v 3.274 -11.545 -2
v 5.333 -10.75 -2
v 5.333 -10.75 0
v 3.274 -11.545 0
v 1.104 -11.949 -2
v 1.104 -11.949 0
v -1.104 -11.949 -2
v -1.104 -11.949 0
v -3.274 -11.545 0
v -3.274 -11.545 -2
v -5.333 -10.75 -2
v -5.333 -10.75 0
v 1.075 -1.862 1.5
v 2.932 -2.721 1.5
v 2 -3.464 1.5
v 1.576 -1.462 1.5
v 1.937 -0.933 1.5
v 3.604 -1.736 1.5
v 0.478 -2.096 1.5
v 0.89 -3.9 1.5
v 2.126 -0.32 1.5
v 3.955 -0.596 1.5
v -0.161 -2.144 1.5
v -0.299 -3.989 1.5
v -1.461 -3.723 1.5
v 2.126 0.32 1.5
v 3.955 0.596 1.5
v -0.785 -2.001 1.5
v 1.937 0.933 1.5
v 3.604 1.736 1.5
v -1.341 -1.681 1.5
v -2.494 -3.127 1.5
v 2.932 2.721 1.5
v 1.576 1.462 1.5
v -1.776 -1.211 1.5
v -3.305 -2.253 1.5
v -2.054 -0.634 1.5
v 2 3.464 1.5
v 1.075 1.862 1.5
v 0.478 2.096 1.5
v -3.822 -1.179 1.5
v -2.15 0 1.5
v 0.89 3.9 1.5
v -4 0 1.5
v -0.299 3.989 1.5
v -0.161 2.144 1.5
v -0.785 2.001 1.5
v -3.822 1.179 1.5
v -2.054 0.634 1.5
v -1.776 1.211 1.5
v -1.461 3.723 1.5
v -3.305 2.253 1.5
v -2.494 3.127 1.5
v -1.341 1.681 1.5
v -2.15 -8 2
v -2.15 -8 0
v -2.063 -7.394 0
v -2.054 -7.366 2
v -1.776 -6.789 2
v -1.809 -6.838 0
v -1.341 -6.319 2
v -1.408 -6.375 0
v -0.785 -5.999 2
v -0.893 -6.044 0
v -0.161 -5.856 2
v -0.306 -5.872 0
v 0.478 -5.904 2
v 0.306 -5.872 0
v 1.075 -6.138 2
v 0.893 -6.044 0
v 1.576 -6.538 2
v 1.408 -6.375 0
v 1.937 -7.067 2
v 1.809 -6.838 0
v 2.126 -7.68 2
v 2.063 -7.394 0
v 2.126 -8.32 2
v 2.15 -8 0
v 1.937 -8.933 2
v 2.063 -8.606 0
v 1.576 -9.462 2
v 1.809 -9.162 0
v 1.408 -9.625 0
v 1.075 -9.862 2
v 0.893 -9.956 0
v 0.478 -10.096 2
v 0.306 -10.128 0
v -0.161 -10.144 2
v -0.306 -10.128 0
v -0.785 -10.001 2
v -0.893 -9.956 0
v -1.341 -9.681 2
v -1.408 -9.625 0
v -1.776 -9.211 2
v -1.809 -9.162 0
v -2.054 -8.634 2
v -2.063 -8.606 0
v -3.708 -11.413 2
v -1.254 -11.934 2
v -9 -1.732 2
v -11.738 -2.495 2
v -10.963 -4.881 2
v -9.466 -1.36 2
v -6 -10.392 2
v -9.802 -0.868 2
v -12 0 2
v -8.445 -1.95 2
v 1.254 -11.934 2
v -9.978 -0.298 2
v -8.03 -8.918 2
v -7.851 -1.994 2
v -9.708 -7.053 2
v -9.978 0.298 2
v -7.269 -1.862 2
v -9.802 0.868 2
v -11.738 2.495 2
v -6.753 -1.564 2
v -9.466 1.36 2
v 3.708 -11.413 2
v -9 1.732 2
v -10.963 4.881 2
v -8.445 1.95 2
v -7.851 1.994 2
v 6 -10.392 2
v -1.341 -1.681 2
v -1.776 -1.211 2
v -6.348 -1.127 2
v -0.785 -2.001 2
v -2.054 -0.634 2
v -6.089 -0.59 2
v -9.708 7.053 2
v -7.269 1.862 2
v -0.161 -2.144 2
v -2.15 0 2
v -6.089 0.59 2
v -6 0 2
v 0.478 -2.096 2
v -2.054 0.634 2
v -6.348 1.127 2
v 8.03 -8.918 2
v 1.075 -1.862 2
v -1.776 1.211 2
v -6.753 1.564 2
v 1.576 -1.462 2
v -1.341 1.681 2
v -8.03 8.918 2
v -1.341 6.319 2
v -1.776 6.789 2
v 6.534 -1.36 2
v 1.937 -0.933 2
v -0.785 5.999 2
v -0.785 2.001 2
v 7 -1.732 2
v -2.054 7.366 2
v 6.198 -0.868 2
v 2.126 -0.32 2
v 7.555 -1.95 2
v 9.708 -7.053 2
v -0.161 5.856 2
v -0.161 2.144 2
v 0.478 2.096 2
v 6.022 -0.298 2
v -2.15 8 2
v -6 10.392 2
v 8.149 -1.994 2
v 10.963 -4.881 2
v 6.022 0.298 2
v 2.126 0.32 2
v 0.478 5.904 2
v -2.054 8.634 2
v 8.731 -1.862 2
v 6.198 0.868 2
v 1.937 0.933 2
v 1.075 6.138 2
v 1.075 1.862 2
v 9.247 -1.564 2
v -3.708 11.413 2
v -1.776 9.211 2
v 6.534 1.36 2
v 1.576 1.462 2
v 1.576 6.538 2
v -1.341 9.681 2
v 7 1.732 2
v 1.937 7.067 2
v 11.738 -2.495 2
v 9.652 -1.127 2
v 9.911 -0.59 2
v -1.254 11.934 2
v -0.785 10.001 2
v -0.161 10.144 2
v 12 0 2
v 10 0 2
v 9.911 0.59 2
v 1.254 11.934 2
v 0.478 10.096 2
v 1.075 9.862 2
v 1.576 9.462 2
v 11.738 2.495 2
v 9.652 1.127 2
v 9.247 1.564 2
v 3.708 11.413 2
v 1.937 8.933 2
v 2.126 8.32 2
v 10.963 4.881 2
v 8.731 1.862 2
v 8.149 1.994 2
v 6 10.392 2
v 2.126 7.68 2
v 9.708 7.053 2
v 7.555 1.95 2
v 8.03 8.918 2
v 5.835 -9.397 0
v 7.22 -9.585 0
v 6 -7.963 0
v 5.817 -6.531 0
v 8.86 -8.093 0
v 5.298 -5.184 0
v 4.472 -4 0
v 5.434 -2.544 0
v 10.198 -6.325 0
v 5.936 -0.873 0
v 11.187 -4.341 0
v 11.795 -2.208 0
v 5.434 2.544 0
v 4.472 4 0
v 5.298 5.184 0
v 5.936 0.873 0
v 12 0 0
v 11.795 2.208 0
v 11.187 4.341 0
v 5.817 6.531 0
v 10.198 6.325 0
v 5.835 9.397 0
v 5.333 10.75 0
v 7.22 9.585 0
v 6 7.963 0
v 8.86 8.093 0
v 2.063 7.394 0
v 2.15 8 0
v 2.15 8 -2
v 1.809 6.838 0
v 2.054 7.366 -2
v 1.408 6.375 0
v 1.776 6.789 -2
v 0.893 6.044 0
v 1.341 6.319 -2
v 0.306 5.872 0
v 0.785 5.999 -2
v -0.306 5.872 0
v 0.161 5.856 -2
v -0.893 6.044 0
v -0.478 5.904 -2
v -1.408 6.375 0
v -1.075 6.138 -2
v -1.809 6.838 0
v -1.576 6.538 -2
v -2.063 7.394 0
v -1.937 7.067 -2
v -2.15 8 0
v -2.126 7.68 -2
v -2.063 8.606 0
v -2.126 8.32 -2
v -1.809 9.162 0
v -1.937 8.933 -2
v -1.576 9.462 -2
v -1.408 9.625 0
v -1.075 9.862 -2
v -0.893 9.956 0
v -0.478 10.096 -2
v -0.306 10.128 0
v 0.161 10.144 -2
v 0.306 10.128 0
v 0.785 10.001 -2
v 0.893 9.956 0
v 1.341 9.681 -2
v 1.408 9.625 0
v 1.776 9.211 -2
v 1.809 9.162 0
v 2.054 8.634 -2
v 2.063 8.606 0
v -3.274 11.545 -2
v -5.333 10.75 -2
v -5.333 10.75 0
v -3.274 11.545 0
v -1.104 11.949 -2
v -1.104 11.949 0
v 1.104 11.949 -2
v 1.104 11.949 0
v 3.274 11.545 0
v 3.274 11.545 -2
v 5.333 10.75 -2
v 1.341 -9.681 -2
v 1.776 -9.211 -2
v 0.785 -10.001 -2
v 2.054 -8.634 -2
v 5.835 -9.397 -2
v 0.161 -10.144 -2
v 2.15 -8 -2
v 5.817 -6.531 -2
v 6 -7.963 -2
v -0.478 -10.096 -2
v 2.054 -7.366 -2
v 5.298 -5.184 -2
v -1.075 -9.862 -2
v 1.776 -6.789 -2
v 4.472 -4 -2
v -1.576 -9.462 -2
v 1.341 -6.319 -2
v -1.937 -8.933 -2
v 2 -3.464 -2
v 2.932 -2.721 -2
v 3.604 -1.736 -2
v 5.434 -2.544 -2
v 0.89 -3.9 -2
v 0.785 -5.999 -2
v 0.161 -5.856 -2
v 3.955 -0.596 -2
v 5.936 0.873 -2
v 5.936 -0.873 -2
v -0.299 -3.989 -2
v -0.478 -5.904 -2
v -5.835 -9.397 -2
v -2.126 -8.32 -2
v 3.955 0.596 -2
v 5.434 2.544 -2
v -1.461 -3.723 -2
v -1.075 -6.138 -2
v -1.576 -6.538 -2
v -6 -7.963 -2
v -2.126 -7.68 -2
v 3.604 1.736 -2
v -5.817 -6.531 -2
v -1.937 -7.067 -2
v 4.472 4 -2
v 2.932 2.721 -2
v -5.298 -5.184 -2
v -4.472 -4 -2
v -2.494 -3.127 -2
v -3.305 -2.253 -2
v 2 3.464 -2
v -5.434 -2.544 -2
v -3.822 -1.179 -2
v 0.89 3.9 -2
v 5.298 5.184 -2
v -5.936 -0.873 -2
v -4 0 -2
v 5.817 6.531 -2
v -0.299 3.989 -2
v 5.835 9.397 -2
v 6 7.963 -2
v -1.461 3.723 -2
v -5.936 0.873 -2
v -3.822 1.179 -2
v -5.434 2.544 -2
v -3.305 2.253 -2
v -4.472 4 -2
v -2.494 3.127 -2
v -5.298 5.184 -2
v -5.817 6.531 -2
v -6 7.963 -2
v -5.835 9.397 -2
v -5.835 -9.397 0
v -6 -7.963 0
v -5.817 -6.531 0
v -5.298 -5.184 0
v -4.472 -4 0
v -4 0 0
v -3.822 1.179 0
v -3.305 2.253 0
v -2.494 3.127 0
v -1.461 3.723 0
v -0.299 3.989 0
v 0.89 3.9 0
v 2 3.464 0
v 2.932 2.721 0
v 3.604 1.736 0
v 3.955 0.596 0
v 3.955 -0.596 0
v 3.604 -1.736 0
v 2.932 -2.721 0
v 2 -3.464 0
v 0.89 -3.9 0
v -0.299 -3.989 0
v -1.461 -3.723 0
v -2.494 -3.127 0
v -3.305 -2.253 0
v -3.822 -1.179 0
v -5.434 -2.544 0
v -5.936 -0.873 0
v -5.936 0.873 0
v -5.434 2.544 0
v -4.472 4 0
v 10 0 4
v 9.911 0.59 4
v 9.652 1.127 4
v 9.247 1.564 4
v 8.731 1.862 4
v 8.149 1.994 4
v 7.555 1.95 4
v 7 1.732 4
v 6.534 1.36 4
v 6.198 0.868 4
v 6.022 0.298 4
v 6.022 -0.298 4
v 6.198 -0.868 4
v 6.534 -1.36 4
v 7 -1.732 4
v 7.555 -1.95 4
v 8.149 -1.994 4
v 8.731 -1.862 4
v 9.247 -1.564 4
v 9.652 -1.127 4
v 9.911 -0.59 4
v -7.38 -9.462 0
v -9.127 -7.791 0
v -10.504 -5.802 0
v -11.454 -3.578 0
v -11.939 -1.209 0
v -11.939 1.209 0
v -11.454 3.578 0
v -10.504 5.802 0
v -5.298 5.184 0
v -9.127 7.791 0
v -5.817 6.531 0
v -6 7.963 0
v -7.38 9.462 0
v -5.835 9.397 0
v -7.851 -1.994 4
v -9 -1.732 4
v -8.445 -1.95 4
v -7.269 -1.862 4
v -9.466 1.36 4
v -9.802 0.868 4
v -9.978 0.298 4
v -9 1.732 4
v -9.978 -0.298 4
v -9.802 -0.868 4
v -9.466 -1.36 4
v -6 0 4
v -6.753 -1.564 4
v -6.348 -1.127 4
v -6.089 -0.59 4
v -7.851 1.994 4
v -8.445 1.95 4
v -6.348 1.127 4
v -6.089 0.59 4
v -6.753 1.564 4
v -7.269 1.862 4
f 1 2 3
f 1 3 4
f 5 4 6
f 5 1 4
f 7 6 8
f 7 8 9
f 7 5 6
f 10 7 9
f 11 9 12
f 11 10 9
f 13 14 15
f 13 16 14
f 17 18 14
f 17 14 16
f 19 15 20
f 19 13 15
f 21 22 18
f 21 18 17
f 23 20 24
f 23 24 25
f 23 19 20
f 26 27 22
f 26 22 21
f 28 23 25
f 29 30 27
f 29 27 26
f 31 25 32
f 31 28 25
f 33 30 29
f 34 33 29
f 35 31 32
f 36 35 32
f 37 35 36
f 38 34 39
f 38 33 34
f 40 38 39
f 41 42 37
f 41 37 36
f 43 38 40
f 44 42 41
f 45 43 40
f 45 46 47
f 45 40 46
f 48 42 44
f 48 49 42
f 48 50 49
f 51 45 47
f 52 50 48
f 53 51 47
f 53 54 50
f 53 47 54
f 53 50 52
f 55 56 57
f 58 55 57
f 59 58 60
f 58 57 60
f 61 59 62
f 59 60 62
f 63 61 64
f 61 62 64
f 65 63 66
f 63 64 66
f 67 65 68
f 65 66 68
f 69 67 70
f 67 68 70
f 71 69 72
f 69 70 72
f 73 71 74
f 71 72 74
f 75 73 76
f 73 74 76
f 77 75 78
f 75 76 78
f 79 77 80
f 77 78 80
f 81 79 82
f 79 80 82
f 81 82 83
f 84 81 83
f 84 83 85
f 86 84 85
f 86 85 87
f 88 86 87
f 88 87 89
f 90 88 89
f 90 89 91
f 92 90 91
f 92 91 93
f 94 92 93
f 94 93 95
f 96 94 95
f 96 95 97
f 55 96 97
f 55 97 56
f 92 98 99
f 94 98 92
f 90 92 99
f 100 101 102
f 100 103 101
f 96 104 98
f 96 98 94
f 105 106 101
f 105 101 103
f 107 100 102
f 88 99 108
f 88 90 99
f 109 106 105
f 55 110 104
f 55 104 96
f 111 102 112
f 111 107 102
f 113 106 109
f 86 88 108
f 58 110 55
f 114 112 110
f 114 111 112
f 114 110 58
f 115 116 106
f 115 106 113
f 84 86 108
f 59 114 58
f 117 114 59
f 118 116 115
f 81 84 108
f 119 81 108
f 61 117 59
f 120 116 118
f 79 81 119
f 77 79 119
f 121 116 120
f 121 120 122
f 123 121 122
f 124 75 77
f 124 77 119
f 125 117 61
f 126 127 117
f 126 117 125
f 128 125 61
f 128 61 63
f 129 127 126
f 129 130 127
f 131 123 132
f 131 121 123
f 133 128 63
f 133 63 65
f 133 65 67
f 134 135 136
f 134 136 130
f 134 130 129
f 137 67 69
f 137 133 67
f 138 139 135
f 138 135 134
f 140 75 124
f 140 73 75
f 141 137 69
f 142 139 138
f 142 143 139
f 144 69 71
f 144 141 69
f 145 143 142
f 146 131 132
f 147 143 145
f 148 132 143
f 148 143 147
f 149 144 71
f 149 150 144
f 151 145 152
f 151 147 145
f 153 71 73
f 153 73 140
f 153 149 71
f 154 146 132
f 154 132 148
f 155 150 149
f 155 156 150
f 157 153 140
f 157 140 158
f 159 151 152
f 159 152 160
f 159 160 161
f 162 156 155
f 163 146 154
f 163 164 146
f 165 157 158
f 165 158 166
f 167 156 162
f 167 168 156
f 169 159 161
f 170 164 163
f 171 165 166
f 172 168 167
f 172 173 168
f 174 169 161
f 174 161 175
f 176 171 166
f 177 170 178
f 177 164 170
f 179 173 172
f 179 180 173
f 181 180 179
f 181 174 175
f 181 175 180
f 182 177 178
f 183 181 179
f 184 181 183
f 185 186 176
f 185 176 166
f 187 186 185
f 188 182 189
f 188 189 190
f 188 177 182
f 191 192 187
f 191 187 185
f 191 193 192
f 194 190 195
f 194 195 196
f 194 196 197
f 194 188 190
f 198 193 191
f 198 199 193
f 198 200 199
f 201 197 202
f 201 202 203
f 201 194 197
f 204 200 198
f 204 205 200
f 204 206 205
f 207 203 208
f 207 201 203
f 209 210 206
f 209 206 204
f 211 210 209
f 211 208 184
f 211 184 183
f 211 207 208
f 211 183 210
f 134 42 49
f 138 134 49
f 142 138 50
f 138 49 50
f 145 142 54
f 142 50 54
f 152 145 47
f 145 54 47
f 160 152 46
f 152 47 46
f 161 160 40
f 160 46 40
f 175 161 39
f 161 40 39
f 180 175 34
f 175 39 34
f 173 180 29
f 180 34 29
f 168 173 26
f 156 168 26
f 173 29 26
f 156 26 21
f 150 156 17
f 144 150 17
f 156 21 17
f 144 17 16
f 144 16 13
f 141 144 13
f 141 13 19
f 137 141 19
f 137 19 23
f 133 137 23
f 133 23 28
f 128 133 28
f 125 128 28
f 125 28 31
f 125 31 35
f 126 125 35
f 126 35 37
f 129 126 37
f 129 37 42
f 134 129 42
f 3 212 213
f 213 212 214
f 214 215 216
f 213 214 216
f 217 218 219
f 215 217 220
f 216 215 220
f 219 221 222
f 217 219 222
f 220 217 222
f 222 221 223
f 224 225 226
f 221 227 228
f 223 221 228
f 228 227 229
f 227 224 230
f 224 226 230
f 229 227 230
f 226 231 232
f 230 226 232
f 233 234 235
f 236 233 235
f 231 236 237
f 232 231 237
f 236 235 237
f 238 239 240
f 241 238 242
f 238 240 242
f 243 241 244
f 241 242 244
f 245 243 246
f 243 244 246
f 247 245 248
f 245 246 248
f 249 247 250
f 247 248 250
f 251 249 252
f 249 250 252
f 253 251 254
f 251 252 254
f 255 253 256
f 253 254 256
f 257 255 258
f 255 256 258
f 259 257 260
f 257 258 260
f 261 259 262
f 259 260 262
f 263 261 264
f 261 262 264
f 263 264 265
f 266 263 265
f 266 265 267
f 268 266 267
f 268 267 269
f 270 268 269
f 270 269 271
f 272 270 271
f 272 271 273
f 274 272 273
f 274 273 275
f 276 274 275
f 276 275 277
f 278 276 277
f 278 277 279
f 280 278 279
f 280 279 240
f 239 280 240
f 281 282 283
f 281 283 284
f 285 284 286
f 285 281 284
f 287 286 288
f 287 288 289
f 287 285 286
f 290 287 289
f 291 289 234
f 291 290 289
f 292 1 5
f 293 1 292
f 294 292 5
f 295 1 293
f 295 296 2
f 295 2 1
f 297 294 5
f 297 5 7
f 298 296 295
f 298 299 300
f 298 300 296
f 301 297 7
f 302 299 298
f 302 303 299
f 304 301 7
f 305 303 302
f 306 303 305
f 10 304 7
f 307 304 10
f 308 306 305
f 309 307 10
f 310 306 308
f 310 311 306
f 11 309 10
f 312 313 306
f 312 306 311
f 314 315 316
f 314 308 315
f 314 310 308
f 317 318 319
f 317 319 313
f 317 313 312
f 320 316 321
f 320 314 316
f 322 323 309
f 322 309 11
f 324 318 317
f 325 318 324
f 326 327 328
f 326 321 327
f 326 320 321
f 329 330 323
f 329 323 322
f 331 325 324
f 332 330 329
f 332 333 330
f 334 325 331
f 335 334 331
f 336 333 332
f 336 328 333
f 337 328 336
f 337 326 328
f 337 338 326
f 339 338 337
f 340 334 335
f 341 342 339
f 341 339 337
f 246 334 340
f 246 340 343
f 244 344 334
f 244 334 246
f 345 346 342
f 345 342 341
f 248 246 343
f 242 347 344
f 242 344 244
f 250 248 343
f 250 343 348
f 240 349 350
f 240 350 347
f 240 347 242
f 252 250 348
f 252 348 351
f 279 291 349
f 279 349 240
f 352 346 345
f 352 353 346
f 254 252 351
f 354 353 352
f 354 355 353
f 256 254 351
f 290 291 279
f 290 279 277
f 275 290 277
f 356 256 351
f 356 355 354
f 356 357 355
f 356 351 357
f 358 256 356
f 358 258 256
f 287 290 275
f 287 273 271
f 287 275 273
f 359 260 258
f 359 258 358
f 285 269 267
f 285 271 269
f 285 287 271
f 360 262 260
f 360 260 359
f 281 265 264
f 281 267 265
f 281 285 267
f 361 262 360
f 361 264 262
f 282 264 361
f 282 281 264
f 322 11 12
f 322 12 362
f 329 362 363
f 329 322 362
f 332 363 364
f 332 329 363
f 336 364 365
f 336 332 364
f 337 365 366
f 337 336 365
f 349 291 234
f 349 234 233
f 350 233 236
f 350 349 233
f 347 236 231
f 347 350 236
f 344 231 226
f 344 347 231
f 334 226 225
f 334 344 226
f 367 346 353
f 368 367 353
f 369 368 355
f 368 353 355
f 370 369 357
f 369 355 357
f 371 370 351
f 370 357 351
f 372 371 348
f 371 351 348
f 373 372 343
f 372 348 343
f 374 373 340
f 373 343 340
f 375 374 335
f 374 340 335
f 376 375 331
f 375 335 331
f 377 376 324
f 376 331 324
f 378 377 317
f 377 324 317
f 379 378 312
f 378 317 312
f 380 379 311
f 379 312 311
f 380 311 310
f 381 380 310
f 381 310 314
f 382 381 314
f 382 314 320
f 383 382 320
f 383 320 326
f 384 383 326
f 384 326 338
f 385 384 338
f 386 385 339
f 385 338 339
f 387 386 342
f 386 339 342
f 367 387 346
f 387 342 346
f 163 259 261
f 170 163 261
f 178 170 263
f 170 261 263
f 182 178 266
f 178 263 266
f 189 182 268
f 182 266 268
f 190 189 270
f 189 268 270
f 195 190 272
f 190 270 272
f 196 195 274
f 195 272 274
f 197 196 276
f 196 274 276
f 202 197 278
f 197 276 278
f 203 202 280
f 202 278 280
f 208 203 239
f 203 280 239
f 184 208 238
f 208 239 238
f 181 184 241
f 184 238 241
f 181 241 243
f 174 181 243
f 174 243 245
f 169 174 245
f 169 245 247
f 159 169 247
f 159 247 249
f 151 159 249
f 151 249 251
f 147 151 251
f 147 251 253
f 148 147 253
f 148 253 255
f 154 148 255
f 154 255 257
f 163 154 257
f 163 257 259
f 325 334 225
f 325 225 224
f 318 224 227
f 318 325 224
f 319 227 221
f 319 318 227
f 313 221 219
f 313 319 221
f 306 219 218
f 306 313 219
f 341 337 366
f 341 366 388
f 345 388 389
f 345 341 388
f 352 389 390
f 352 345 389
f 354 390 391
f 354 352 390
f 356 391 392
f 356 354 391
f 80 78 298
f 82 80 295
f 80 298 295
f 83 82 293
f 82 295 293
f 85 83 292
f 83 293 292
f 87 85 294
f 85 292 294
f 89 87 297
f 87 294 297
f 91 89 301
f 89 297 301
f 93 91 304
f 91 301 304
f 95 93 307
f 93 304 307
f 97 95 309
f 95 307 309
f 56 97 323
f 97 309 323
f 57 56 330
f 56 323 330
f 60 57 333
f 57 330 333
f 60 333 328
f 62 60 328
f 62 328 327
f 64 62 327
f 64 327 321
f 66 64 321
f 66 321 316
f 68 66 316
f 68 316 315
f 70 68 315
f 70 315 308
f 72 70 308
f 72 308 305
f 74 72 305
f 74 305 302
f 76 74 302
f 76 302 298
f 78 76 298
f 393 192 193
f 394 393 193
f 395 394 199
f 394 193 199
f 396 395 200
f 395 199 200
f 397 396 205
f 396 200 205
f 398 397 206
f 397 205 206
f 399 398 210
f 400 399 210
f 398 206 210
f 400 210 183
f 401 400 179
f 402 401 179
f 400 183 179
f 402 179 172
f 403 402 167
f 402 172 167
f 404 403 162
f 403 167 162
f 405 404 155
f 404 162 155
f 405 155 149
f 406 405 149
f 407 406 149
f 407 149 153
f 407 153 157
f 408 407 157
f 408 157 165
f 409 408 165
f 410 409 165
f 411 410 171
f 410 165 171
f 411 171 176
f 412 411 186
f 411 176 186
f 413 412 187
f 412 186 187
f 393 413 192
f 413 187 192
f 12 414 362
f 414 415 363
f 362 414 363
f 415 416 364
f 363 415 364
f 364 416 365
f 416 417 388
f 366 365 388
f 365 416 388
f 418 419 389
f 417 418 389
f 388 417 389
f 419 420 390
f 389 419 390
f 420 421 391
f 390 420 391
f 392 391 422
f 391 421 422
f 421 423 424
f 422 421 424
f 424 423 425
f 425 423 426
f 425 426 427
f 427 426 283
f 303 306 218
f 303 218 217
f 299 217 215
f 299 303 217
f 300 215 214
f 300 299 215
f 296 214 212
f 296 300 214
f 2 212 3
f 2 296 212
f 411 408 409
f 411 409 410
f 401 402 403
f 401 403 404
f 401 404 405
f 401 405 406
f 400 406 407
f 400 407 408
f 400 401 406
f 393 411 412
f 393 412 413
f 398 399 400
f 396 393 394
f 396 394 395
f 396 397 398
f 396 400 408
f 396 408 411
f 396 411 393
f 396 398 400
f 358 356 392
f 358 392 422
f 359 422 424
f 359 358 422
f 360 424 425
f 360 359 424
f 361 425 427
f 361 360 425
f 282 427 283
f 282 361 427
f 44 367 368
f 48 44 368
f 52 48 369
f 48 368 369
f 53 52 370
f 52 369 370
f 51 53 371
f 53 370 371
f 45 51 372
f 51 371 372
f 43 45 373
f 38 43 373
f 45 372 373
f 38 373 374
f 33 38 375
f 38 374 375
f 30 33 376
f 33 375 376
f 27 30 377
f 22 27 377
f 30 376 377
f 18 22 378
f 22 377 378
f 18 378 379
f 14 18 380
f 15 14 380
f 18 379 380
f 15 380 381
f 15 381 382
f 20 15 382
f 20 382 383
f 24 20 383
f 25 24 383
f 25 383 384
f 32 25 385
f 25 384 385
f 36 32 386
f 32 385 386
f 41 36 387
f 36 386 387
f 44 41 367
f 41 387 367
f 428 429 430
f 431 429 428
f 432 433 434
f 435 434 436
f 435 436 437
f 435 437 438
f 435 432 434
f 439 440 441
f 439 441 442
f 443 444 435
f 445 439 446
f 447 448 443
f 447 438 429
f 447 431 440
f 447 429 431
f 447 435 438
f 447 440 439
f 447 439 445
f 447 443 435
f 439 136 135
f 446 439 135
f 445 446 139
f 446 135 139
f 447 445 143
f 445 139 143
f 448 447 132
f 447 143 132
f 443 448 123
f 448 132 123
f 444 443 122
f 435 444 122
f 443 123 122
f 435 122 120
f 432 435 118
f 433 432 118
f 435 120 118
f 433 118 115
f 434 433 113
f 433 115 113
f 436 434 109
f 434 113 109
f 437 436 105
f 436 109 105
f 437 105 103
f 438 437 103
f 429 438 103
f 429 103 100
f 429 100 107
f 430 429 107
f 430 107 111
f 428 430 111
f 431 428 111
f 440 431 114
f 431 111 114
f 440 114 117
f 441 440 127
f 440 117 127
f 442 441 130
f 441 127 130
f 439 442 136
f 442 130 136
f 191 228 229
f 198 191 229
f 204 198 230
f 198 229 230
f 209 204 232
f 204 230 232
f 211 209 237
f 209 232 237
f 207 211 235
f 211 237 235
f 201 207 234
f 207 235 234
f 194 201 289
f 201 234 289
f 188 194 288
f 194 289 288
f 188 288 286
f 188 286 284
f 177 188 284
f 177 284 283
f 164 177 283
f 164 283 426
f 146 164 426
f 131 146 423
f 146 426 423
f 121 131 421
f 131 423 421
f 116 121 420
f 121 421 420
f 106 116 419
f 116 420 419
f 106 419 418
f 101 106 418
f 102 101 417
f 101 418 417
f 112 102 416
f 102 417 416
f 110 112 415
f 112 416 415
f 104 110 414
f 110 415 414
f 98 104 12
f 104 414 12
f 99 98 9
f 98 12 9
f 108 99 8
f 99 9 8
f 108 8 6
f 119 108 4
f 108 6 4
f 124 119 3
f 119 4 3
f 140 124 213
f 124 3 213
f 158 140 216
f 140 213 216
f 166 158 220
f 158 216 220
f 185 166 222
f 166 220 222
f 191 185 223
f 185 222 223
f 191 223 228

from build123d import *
from build123d.topology import SkipClean

# Parameters (mm, degrees)
SKETCH1_R                  = 12
BOSS_EXTRUDE1_DEPTH        = 2
SKETCH2_R                  = 2
BOSS_EXTRUDE2_DEPTH        = 2
F_4_3_4_3_DIAMETER_HOLE1_D = 4.3
BOSS_EXTRUDE3_START        = 2
SKETCH5_R                  = 2.15
SKETCH5_R_2                = 4
BOSS_EXTRUDE3_DEPTH        = 2
SKETCH6_R                  = 4
CUT_EXTRUDE1_DEPTH         = 1.5


with BuildPart() as part:
    # Sketch1 → Boss-Extrude1 (new body)
    with BuildSketch(Plane.XY):
        Circle(SKETCH1_R)
    extrude(amount=BOSS_EXTRUDE1_DEPTH)

    # Sketch2 → Boss-Extrude2 (add)
    with BuildSketch(Plane.XY.offset(2)):
        with Locations((-8, 0)):
            Circle(SKETCH2_R)
        with Locations((8, 0)):
            Circle(SKETCH2_R)
    extrude(amount=BOSS_EXTRUDE2_DEPTH)

    # Ø4.3 (4.3) Diameter Hole1 (through all)
    with Locations(Plane.XY.offset(2)):
        with Locations((0, 8), (0, 0), (0, -8)):
            Hole(F_4_3_4_3_DIAMETER_HOLE1_D / 2)

    # Sketch5 → Boss-Extrude3 (add)
    with SkipClean():  # the faces are left unmerged after this step: merging them gives an invalid solid
        with BuildSketch(Plane(origin=(0, 0, 0), x_dir=(-1, 0, 0), z_dir=(0, 0, -1)).offset(BOSS_EXTRUDE3_START)):
            with BuildLine():
                ThreePointArc((4.472135955, -4), (6, 0), (4.472135955, 4))
                ThreePointArc((4.472135955, 4), (5.951826612, 7.241211504), (5.332682252, 10.75))
                ThreePointArc((5.332682252, 10.75), (0, 12), (-5.332682252, 10.75))
                ThreePointArc((-5.332682252, 10.75), (-5.951826612, 7.241211504), (-4.472135955, 4))
                ThreePointArc((-4.472135955, 4), (-6, 0), (-4.472135955, -4))
                ThreePointArc((-4.472135955, -4), (-5.951826612, -7.241211504), (-5.332682252, -10.75))
                ThreePointArc((-5.332682252, -10.75), (0, -12), (5.332682252, -10.75))
                ThreePointArc((5.332682252, -10.75), (5.951826612, -7.241211504), (4.472135955, -4))
            make_face()
            with Locations(Location((0, 8, 0), (0, 0, 180))):
                Circle(SKETCH5_R, mode=Mode.SUBTRACT)
            with Locations(Location((0, -8, 0), (0, 0, 180))):
                Circle(SKETCH5_R, mode=Mode.SUBTRACT)
            Circle(SKETCH5_R_2, mode=Mode.SUBTRACT)
        extrude(amount=-BOSS_EXTRUDE3_DEPTH)

    # Sketch6 → Cut-Extrude1 (cut)
    with SkipClean():  # the faces are left unmerged after this step: merging them gives an invalid solid
        with BuildSketch(Plane(origin=(0, 0, 0), x_dir=(-1, 0, 0), z_dir=(0, 0, -1))):
            Circle(SKETCH6_R)
        extrude(amount=-CUT_EXTRUDE1_DEPTH, mode=Mode.SUBTRACT)


solid = part.part
